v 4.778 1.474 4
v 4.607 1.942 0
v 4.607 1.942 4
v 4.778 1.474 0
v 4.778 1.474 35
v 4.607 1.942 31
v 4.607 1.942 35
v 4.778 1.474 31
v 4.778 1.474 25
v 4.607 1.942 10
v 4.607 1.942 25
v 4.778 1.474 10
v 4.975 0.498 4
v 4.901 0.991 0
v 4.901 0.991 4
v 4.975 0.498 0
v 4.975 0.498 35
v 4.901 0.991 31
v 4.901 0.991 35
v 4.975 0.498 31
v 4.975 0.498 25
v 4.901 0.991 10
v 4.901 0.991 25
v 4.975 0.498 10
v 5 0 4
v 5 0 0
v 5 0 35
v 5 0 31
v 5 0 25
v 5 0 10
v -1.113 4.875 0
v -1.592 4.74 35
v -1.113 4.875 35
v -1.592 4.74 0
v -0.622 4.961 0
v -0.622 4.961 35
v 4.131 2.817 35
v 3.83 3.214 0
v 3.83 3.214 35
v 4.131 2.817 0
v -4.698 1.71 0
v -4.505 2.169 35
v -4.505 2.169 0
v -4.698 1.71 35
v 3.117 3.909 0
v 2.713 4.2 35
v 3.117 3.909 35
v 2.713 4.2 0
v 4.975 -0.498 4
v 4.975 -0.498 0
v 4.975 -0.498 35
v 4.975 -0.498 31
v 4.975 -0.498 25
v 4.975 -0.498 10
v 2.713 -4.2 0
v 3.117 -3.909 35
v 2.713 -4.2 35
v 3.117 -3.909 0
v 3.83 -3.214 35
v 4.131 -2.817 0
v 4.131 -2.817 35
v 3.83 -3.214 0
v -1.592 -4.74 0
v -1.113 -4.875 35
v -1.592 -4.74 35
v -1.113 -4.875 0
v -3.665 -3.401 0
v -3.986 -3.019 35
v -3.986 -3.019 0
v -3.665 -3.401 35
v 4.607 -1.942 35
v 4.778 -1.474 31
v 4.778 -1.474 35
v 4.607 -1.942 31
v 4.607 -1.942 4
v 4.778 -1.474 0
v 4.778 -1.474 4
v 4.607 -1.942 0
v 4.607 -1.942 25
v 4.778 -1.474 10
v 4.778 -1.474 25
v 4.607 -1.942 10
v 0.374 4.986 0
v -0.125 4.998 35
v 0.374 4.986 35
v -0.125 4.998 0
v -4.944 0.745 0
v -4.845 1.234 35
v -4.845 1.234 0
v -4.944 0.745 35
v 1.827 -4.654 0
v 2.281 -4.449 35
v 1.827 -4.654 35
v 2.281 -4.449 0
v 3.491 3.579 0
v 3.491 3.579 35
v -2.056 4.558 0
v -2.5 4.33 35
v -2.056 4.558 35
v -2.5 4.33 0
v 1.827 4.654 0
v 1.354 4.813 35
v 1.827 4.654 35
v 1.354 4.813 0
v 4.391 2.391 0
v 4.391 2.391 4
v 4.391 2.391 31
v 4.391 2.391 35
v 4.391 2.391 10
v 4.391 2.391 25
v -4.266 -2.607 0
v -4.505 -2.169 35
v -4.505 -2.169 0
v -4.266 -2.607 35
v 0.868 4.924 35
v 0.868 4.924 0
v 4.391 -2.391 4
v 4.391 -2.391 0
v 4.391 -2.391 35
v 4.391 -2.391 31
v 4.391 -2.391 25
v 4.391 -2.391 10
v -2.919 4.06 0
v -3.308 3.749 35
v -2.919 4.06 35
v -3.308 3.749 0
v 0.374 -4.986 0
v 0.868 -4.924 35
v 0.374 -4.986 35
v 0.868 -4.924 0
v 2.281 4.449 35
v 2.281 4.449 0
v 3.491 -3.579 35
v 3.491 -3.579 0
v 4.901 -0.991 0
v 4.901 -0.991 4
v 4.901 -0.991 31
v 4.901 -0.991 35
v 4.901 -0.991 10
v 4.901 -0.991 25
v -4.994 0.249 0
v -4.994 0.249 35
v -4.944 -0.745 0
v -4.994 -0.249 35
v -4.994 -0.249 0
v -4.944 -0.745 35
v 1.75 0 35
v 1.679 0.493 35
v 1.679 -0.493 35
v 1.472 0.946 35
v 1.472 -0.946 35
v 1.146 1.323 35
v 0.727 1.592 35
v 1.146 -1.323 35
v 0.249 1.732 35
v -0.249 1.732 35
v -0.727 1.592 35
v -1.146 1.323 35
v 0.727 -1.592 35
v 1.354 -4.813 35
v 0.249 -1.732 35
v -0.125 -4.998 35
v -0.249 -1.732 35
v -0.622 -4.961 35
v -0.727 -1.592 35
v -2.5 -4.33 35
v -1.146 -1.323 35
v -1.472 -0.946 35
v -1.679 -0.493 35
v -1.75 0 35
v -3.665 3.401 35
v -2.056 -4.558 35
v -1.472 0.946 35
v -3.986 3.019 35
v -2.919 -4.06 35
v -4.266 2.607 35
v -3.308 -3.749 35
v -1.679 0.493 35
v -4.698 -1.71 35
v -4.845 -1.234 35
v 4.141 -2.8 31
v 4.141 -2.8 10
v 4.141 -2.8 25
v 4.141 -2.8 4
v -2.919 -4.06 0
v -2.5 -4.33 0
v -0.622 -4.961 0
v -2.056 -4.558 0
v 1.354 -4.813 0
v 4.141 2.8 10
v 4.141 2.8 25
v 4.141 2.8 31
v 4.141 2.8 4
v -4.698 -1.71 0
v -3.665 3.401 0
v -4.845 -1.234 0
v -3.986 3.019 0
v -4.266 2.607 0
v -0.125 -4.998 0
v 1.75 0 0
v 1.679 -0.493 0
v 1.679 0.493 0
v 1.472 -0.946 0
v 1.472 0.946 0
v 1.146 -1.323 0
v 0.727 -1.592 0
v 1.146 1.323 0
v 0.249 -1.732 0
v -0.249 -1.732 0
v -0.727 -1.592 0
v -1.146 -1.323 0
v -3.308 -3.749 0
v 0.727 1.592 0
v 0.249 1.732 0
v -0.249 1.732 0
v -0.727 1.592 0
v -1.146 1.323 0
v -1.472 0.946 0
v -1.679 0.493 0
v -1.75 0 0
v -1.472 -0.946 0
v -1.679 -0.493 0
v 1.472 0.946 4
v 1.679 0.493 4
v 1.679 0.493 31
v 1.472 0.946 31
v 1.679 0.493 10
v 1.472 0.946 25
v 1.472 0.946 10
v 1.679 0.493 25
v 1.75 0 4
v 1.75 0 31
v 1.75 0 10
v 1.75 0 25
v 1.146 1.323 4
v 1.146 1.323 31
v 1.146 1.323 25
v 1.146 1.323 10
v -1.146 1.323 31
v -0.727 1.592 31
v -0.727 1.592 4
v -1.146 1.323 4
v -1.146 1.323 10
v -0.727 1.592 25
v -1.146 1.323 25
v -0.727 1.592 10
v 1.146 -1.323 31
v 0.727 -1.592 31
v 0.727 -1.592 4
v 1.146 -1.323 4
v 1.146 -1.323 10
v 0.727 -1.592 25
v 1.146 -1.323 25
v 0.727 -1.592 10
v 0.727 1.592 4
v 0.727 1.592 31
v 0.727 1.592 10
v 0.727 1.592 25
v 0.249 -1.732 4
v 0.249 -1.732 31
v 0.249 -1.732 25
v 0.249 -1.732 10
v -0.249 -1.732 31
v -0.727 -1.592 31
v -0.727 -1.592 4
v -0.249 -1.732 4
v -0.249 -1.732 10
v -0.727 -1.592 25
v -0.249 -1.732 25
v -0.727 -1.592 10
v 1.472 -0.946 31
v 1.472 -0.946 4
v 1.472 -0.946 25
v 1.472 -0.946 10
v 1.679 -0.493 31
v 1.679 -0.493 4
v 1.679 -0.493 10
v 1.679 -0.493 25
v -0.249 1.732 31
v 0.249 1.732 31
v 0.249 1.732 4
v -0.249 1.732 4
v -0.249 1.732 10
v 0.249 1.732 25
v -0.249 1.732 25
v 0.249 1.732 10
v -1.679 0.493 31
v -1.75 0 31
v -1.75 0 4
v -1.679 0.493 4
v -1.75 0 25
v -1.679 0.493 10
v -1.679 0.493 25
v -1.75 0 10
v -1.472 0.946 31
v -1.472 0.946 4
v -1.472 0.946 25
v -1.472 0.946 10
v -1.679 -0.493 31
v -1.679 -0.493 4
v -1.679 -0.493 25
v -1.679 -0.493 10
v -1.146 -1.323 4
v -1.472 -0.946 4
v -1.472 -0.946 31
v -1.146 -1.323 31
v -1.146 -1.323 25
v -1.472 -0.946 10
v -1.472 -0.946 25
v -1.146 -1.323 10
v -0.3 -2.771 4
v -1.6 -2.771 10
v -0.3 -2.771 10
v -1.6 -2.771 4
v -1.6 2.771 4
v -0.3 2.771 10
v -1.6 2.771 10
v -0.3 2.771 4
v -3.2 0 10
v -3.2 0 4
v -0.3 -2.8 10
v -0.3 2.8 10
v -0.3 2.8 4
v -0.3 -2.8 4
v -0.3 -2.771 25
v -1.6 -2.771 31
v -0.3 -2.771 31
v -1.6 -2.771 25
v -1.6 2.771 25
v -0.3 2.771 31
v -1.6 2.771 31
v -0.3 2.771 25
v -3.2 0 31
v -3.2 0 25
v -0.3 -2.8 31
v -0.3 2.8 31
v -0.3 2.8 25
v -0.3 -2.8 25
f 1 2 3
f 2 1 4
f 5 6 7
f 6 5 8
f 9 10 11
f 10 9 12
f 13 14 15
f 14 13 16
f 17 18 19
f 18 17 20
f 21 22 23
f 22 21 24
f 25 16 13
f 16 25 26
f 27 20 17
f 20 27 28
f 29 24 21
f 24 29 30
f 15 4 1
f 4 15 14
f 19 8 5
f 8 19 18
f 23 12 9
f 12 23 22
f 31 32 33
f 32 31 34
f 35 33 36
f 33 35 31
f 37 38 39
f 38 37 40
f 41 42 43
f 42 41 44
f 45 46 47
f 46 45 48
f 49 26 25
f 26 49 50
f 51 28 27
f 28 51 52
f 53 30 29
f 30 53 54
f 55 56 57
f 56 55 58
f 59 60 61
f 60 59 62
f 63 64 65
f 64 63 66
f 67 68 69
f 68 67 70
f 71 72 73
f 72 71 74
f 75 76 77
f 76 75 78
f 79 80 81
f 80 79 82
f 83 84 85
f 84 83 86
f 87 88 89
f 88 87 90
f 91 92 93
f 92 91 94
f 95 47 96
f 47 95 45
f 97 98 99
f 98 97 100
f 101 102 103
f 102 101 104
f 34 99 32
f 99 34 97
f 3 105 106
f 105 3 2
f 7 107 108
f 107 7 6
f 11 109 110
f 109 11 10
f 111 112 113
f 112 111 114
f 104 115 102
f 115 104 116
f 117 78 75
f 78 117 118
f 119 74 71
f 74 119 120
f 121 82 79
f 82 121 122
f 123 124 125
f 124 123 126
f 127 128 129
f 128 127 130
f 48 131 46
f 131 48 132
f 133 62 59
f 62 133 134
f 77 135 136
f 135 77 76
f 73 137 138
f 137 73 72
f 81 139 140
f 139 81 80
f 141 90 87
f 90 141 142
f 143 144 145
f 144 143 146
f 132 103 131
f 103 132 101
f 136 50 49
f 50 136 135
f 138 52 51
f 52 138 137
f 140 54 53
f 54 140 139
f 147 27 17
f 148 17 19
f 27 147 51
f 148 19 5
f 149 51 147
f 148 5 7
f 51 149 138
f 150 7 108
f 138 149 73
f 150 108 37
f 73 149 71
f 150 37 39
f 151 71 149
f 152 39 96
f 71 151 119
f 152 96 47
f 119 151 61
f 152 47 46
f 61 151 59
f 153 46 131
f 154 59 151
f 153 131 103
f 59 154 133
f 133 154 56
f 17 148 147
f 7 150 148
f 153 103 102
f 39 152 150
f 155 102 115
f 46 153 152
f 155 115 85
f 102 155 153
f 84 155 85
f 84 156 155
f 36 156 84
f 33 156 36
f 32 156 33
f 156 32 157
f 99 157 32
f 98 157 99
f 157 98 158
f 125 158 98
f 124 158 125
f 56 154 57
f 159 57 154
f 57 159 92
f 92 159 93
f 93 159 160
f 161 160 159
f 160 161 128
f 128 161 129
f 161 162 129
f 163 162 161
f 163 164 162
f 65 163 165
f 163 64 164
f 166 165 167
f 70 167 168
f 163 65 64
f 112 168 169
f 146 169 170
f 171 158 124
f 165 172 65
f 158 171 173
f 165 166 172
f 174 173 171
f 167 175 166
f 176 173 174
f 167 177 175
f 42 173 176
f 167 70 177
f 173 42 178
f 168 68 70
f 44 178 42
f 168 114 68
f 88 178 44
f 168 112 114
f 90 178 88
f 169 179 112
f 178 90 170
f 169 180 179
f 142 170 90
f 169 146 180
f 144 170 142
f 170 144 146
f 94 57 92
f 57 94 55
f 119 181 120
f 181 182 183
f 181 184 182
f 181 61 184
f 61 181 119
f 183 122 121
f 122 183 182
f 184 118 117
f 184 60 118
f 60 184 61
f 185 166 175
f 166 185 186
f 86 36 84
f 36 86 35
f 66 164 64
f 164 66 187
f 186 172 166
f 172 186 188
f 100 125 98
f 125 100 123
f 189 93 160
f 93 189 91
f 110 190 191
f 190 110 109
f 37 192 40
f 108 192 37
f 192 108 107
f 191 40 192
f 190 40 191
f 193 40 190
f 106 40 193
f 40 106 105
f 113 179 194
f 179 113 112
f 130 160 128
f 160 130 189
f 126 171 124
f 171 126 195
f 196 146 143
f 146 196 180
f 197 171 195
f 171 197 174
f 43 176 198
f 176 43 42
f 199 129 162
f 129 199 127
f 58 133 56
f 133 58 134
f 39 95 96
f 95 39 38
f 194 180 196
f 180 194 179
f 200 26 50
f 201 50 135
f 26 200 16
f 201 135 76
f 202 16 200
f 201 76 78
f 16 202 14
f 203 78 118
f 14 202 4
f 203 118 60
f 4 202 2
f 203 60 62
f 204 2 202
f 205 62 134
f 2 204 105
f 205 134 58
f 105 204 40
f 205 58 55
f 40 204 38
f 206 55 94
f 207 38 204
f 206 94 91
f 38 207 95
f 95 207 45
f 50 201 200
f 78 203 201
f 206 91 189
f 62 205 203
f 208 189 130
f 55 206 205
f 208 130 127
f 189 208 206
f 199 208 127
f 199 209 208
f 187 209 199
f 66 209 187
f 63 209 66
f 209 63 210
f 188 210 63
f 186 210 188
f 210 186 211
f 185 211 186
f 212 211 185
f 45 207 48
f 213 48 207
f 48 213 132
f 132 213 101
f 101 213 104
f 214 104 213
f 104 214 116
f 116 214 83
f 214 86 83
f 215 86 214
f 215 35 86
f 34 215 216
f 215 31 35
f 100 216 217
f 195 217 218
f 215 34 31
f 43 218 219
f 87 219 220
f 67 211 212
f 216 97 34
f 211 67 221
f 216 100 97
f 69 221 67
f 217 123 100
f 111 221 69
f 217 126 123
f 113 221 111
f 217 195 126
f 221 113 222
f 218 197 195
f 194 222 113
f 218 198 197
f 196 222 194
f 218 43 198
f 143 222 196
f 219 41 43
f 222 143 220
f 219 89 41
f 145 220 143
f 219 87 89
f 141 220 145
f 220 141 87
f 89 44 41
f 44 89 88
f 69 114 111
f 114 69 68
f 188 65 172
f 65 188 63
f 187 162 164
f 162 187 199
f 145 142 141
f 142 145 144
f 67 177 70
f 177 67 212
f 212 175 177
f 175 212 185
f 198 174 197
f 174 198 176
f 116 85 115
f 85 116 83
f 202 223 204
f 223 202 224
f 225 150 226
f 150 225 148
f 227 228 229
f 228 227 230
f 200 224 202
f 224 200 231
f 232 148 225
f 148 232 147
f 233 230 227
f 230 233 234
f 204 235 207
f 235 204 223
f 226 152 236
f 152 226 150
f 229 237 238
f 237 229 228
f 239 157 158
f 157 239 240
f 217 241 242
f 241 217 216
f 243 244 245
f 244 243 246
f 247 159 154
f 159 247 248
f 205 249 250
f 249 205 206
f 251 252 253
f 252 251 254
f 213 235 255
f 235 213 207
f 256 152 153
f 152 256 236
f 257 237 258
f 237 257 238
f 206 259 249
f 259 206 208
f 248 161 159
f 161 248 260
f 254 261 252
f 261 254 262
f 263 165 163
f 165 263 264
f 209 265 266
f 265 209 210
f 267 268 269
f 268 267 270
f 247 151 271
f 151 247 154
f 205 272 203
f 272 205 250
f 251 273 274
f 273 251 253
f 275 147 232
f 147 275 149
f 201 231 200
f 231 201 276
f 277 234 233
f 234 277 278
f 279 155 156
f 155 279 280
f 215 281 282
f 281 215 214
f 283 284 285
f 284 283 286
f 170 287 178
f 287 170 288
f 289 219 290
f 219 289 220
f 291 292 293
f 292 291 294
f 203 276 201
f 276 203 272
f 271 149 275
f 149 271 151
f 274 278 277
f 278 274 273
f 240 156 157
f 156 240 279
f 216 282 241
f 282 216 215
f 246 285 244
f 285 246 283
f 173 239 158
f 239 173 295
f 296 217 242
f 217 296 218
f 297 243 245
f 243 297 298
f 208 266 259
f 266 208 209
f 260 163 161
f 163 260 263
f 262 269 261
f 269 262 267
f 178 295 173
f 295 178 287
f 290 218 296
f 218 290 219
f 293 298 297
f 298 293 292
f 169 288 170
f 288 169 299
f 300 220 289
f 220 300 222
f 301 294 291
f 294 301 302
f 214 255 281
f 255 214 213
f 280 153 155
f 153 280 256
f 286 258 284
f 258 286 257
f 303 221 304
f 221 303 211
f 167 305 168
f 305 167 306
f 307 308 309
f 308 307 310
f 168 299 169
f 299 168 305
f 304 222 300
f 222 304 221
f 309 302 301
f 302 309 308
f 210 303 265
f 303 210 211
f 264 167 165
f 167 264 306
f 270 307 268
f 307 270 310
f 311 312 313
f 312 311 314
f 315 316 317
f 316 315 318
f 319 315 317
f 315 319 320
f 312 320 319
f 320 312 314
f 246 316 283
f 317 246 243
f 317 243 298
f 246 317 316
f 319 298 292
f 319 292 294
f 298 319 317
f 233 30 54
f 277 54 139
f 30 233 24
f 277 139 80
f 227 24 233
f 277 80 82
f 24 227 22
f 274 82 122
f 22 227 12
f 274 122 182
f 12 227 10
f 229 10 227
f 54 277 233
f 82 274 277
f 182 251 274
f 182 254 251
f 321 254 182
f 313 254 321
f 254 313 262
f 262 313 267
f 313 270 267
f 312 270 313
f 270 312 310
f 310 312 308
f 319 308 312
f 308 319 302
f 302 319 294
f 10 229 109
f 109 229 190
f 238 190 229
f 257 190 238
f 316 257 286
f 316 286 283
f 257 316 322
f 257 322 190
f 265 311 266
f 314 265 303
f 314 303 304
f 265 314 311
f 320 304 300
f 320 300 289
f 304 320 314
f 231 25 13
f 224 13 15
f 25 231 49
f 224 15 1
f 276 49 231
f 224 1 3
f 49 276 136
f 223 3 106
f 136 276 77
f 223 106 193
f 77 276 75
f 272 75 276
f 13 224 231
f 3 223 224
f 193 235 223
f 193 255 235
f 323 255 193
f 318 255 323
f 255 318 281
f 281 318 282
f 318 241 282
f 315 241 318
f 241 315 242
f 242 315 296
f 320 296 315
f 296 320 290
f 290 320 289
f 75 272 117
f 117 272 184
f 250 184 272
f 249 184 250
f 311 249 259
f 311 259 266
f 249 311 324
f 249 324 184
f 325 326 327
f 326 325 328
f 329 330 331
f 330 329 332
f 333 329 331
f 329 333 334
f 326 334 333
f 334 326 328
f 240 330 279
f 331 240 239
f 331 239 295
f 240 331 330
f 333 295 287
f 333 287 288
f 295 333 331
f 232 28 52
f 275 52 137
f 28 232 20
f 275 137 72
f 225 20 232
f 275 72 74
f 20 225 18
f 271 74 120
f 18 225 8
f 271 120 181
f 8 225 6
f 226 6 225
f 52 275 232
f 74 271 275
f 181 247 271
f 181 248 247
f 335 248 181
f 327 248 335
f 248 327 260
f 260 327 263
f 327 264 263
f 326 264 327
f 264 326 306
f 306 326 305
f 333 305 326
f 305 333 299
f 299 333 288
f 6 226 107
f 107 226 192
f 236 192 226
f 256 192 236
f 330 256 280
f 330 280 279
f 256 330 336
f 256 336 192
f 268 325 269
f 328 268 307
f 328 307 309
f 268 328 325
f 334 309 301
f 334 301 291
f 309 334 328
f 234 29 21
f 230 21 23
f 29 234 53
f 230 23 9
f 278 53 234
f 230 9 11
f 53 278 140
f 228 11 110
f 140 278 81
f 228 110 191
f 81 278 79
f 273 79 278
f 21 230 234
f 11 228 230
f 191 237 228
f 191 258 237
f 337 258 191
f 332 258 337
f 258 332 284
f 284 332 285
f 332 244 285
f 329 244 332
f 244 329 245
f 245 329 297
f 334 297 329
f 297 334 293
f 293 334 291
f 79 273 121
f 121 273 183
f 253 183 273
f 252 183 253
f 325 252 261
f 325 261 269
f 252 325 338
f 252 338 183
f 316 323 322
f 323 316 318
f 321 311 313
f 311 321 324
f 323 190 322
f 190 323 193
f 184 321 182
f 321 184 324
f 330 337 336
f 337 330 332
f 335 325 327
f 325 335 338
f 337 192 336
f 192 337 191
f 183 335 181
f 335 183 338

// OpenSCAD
$fa=1;
$fs=0.5;

height=35;
diameter=10;
holed=3.5;
nutOffset=7;
nut_dim=6.4;
nut_height=6;
nut_cutout=5.6;

difference() {
    cylinder(h=height, d=diameter);
    
    // screw hole
    cylinder(h=height, d=holed);
    
    // nut cutouts
    translate([0, 0, nutOffset]) {
        cylinder( d=nut_dim, h=nut_height, $fn=6, center=true);
    }
    translate([0, 0, height-nutOffset]) {
        cylinder( d=nut_dim, h=nut_height, $fn=6, center=true);
    }
    
    // nut slots
    translate([2.5, 0, nutOffset]) {
        cube([nut_cutout, nut_cutout, nut_height], center=true);
    }
    translate([2.5, 0, height-nutOffset]) {
        cube([nut_cutout, nut_cutout, nut_height], center=true);
    }
}
